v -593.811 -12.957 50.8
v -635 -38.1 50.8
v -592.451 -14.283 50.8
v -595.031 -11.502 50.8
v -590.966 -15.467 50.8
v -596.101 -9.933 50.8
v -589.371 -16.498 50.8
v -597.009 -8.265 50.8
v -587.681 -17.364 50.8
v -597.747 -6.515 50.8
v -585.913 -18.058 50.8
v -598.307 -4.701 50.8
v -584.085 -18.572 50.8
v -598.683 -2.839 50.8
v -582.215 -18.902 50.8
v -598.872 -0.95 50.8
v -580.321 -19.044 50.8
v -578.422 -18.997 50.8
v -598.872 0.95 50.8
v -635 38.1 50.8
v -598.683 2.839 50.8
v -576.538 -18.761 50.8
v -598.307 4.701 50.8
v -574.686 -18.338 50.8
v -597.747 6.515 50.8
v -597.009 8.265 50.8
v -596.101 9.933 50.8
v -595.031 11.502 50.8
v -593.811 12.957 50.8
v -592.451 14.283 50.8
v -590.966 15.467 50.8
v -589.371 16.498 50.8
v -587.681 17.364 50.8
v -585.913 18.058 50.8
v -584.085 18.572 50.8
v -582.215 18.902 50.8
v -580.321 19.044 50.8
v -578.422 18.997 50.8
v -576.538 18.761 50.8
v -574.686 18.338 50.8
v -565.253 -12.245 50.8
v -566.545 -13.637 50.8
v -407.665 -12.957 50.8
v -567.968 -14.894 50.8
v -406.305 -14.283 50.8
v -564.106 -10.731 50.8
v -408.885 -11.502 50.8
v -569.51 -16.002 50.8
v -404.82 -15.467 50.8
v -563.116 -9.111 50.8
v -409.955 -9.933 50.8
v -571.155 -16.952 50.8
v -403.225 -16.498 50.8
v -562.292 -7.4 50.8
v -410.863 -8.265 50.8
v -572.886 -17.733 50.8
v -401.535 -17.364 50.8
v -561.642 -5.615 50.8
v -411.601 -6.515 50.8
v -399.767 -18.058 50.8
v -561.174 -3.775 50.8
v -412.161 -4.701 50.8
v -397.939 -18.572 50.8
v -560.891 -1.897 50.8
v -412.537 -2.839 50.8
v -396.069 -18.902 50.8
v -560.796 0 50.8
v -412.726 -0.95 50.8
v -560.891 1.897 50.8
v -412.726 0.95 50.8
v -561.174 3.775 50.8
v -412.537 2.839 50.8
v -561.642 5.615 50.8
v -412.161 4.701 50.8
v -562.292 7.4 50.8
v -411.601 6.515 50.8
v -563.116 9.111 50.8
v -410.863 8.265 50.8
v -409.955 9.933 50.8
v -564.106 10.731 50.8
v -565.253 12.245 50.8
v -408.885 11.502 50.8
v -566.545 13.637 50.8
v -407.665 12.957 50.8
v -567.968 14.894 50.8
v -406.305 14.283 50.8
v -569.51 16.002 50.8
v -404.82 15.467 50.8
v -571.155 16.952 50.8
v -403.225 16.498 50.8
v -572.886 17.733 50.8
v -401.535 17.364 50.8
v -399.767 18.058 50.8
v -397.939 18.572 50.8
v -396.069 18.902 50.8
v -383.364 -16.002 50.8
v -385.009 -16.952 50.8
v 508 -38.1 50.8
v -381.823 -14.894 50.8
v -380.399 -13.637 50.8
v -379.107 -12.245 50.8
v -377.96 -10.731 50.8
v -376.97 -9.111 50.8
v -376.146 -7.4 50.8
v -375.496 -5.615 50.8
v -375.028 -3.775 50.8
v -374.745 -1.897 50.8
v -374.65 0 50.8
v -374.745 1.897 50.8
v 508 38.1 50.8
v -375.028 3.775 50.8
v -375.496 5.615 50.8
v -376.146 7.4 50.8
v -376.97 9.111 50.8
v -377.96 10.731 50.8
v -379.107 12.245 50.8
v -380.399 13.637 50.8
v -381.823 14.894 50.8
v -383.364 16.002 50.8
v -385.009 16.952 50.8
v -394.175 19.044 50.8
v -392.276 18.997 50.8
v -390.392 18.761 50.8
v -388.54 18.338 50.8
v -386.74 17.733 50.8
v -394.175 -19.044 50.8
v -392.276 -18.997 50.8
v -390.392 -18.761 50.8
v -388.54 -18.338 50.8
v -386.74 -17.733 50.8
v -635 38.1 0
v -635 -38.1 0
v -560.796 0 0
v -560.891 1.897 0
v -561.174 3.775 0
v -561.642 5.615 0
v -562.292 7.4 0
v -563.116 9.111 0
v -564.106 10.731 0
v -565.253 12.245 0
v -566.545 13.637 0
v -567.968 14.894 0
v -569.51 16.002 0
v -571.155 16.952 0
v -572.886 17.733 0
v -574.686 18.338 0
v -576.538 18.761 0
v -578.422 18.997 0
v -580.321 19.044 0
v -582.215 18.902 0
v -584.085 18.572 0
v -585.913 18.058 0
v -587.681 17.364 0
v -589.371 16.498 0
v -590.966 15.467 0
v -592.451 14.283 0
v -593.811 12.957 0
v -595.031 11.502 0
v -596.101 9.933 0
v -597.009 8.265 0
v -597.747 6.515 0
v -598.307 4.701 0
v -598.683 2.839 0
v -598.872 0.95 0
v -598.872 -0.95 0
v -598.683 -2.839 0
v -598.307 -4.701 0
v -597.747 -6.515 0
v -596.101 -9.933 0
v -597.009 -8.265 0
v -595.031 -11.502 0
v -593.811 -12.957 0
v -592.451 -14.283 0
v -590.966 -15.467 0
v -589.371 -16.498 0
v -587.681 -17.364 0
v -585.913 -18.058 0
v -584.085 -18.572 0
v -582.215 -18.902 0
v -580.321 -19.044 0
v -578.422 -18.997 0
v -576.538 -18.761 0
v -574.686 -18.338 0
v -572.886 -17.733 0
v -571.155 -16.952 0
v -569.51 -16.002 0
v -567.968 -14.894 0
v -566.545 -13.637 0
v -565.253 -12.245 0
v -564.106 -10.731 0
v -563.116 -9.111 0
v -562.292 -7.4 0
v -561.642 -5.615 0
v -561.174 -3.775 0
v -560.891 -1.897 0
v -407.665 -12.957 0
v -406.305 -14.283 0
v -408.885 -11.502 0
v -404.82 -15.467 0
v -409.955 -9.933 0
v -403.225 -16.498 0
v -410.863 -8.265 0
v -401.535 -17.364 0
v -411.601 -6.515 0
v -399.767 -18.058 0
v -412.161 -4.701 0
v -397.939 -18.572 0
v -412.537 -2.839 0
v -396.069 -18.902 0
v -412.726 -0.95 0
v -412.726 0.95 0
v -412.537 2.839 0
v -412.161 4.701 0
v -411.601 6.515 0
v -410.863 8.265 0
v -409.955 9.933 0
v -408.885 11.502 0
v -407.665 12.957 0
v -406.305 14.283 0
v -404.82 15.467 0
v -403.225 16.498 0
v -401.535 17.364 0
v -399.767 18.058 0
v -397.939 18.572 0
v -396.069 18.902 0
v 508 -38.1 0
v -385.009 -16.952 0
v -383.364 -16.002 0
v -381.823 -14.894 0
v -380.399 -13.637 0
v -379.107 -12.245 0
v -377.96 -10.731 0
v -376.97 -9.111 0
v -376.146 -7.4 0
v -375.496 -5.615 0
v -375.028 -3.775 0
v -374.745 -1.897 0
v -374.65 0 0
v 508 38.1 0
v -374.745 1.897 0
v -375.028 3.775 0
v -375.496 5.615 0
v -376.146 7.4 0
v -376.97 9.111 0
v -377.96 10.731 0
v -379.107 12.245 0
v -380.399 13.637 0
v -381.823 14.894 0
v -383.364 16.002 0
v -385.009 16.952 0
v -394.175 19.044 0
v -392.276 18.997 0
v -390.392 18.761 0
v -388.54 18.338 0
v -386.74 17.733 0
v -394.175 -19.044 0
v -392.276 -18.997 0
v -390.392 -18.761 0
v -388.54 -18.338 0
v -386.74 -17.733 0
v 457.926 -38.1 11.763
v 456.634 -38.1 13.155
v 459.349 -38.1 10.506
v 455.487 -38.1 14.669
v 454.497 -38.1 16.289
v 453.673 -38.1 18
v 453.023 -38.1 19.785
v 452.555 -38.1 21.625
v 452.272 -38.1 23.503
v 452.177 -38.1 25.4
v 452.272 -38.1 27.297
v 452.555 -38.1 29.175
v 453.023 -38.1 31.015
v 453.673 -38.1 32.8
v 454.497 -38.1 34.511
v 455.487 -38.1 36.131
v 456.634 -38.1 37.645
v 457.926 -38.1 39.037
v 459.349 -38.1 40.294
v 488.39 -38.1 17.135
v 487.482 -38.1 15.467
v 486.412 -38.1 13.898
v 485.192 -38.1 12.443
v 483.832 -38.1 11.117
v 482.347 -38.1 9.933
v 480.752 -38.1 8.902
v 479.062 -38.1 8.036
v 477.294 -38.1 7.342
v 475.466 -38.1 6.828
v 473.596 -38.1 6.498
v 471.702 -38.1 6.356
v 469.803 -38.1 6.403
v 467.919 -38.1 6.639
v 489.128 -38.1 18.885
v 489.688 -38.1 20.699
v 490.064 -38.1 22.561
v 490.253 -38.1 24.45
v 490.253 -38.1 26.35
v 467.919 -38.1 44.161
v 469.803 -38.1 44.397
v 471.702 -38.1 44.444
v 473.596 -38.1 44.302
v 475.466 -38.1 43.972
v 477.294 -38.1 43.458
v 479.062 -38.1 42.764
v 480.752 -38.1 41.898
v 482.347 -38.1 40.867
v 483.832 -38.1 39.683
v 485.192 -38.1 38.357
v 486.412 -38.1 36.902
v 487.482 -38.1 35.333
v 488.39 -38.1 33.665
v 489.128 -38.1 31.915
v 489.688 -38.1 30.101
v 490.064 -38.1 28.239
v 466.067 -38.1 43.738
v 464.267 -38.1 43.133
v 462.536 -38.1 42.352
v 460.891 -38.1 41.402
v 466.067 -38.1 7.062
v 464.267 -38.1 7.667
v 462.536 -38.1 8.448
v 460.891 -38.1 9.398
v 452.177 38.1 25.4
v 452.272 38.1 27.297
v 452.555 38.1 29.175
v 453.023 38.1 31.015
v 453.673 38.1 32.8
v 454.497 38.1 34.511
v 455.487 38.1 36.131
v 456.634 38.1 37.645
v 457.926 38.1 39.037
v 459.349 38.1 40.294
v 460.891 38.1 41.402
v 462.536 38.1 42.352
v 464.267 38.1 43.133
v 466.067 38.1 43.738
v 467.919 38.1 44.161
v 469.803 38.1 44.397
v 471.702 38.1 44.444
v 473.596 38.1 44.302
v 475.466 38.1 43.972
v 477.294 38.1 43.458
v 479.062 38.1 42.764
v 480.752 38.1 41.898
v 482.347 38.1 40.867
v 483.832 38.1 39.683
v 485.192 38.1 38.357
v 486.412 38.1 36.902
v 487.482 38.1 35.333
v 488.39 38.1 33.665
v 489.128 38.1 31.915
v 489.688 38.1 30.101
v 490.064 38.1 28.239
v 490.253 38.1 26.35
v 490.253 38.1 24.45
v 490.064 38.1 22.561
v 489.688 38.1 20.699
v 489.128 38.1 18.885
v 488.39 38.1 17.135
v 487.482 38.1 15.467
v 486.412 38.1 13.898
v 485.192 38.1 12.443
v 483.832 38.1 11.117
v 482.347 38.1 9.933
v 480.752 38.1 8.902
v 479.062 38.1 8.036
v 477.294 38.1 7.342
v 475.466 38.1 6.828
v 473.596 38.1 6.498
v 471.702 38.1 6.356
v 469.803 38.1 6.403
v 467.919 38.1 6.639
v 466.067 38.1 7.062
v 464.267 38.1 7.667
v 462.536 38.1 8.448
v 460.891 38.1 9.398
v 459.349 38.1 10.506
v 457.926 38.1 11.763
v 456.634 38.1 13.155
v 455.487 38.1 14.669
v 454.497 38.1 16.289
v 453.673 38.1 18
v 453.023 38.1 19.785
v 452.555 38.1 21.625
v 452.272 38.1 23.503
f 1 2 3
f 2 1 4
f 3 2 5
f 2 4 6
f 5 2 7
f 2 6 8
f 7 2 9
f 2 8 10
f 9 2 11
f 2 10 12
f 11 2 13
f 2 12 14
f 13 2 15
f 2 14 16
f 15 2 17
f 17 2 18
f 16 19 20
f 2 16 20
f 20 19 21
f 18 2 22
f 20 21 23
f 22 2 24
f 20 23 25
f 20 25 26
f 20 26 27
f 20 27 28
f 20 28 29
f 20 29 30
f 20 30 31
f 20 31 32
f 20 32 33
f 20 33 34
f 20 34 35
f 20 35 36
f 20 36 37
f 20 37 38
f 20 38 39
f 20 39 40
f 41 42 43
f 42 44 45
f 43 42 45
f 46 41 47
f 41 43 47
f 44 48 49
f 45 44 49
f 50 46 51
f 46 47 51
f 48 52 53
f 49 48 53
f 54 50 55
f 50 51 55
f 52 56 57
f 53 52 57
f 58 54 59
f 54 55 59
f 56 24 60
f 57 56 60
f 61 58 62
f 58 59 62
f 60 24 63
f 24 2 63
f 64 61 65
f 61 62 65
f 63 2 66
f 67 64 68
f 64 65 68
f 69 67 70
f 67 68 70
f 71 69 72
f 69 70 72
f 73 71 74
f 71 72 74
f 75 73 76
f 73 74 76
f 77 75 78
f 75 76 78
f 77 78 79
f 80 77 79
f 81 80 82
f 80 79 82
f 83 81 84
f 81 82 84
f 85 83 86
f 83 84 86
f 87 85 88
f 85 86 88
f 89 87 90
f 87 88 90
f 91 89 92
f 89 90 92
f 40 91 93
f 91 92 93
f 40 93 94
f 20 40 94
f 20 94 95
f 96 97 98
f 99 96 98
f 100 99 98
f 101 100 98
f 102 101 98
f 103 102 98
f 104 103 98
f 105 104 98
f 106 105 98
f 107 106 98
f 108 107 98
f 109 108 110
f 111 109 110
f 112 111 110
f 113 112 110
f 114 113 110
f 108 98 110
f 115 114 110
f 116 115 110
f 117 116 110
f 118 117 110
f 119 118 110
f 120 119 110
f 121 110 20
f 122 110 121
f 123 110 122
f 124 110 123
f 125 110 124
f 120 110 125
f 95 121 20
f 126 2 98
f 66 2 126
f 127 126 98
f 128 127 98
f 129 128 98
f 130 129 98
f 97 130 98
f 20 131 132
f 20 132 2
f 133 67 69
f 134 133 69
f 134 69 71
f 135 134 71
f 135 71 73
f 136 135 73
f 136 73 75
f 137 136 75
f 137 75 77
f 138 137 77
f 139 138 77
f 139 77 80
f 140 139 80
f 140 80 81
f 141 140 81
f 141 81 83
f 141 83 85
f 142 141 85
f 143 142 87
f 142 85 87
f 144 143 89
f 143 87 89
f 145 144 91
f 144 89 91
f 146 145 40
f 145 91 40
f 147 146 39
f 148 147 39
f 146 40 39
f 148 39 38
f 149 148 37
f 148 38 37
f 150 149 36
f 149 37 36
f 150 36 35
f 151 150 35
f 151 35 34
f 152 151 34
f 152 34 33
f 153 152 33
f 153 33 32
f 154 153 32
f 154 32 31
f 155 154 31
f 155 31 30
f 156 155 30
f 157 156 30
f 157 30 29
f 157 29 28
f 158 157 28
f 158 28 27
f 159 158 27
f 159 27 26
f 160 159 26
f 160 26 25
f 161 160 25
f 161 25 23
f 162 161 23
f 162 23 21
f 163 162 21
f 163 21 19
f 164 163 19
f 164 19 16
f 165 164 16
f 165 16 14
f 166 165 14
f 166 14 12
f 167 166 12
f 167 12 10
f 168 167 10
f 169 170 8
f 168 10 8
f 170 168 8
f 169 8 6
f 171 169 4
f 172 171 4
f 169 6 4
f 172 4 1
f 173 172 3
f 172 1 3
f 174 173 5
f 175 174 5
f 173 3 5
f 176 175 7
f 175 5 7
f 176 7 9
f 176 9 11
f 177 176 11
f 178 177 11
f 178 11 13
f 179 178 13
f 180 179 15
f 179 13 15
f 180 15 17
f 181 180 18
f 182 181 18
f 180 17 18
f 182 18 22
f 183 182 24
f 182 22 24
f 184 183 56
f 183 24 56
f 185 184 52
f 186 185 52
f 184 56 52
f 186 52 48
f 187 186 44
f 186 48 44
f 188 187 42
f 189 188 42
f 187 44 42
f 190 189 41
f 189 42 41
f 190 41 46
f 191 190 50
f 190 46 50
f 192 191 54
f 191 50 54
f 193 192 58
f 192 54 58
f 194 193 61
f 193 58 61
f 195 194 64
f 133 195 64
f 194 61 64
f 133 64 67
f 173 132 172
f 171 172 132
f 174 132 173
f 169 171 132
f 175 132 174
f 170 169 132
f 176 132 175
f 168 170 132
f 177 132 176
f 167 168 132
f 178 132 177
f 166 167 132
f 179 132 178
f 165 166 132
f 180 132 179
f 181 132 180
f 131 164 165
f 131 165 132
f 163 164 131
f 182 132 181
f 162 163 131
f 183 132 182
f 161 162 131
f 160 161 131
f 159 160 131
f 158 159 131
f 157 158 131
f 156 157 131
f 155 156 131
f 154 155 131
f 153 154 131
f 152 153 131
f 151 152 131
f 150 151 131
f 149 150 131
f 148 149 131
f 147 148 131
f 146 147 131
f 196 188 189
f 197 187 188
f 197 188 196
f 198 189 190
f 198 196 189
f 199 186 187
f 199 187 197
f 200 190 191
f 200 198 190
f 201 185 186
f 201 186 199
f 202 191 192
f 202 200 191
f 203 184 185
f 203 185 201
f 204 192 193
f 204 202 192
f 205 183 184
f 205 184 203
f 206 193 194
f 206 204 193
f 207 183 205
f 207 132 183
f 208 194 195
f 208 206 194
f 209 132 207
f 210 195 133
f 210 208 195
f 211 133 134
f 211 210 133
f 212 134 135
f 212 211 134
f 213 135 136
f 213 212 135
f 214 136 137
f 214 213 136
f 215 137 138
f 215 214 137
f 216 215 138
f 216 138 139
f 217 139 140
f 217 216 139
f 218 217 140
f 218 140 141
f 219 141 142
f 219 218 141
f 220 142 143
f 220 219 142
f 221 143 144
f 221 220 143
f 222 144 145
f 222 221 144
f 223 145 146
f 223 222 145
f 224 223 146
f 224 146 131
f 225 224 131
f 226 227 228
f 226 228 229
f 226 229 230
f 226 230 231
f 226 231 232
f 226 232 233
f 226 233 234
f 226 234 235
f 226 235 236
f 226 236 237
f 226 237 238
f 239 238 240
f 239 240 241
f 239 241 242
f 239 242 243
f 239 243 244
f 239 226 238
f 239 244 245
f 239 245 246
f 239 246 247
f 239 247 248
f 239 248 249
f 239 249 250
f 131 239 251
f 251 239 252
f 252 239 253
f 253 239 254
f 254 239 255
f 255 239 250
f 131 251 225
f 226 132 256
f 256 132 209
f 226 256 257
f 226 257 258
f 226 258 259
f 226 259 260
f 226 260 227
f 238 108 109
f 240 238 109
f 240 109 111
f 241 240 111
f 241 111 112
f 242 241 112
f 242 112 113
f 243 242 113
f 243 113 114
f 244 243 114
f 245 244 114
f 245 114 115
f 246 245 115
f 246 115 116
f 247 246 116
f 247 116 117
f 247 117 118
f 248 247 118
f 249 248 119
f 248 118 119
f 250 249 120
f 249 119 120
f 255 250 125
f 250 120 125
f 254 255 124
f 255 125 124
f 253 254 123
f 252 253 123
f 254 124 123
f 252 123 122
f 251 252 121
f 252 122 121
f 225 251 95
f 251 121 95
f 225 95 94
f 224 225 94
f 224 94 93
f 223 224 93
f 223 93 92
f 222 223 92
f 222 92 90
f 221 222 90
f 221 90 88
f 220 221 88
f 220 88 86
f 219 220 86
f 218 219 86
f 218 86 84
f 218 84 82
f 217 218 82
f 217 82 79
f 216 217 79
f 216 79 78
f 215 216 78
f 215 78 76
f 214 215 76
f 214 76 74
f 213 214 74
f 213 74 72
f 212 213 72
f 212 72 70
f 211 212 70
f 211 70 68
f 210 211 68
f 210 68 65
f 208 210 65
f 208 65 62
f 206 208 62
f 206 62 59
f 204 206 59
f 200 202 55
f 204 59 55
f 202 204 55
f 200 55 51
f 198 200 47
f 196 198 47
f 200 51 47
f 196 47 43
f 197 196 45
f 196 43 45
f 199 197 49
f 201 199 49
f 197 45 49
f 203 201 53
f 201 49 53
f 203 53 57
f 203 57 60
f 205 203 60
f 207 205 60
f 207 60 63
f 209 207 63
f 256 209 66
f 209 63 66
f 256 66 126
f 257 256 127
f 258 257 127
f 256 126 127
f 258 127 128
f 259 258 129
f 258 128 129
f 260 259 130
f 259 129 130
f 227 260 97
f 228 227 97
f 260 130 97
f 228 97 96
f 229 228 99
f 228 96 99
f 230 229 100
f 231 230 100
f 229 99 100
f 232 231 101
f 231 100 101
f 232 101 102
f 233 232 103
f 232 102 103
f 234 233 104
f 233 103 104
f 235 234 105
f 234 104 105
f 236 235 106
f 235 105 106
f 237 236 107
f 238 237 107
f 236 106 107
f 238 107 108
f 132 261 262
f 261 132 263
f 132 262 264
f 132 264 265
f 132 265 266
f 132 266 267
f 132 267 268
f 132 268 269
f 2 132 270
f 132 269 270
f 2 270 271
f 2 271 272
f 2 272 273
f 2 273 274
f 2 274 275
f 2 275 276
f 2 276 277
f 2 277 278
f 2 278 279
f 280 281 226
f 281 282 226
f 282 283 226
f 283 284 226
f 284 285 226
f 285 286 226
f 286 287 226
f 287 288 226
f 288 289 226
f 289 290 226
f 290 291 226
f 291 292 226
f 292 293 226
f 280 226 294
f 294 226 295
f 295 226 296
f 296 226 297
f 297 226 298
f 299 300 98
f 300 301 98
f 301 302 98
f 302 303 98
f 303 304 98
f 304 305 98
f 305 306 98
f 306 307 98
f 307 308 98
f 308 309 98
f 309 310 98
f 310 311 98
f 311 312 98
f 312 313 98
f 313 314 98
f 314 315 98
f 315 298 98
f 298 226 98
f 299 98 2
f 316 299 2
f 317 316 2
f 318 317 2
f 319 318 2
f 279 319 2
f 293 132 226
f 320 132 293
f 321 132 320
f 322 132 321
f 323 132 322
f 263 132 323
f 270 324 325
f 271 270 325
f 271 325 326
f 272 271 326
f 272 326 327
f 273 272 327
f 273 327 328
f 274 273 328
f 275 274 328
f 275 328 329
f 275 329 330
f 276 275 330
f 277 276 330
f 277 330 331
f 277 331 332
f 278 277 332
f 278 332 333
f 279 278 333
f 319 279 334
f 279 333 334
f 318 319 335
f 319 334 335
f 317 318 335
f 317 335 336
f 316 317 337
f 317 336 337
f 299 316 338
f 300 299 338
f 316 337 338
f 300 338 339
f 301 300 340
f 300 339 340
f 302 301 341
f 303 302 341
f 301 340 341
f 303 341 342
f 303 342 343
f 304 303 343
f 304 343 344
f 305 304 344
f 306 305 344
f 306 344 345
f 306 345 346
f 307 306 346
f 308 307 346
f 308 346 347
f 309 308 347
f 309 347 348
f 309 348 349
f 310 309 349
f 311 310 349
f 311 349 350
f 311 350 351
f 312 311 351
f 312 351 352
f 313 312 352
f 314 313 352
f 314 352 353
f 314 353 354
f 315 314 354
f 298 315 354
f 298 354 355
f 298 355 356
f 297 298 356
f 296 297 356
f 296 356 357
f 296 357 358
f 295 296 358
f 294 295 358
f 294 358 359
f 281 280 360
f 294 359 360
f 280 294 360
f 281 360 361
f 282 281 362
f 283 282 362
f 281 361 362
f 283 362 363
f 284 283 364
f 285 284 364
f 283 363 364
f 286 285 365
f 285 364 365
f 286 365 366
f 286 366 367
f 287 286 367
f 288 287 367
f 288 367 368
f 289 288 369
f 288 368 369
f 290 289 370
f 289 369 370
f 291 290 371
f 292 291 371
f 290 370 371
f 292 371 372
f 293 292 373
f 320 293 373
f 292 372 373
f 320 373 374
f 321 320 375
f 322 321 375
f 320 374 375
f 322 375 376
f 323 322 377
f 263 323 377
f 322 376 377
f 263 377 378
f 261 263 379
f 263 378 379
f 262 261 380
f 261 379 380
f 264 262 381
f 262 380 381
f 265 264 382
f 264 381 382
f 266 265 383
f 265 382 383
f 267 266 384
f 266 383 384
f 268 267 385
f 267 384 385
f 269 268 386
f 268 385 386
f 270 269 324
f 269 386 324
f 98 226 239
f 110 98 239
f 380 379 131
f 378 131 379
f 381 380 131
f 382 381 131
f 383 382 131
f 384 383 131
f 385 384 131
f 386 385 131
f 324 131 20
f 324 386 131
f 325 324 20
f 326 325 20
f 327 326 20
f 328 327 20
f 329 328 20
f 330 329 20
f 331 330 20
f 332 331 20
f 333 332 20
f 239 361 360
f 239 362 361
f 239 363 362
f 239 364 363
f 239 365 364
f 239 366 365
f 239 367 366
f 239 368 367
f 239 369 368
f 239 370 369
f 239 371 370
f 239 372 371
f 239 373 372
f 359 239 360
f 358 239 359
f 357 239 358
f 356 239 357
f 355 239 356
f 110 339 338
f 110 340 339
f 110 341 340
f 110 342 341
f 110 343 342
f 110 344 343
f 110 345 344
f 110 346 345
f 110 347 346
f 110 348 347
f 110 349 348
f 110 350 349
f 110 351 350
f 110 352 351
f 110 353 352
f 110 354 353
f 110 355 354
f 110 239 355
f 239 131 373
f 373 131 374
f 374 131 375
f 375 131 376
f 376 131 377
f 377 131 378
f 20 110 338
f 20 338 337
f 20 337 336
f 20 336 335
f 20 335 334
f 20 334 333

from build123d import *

# Parameters (mm, degrees)
CROQUIS1_W              = 1016
CROQUIS1_H              = 76.2
SALIENTE_EXTRUIR1_DEPTH = 50.8
CROQUIS2_R              = 19.05
CORTAR_EXTRUIR1_DEPTH   = 512.953367017
CROQUIS5_R              = 19.05
CORTAR_EXTRUIR3_DEPTH   = 517.188996396
CROQUIS6_W              = 50.8
CROQUIS6_H              = 76.2
SALIENTE_EXTRUIR2_DEPTH = 127
CROQUIS7_R              = 19.05
CORTAR_EXTRUIR4_DEPTH   = 639.167101941


with BuildPart() as part:
    # Croquis1 → Saliente-Extruir1 (new body)
    with BuildSketch(Plane.XY):
        Rectangle(CROQUIS1_W, CROQUIS1_H)
    extrude(amount=SALIENTE_EXTRUIR1_DEPTH)

    # Croquis2 → Cortar-Extruir1 (cut, through all)
    with BuildSketch(Plane.XY.offset(50.8)):
        with Locations((-393.7, 0)):
            Circle(CROQUIS2_R)
    extrude(amount=-CORTAR_EXTRUIR1_DEPTH, mode=Mode.SUBTRACT)

    # Croquis5 → Cortar-Extruir3 (cut, through all)
    with BuildSketch(Plane(origin=(0, 38.1, 0), x_dir=(1, 0, 0), z_dir=(0, 1, 0))):
        with Locations(Location((471.22697118, -25.4, 0), (0, 0, 180))):
            Circle(CROQUIS5_R)
    extrude(amount=-CORTAR_EXTRUIR3_DEPTH, mode=Mode.SUBTRACT)

    # Croquis6 → Saliente-Extruir2 (add)
    with BuildSketch(Plane.ZY.offset(508)):
        with Locations((25.4, 0)):
            Rectangle(CROQUIS6_W, CROQUIS6_H)
    extrude(amount=SALIENTE_EXTRUIR2_DEPTH)

    # Croquis7 → Cortar-Extruir4 (cut, through all)
    with BuildSketch(Plane.XY.offset(50.8)):
        with Locations((-579.845937481, 0)):
            Circle(CROQUIS7_R)
    extrude(amount=-CORTAR_EXTRUIR4_DEPTH, mode=Mode.SUBTRACT)


solid = part.part
